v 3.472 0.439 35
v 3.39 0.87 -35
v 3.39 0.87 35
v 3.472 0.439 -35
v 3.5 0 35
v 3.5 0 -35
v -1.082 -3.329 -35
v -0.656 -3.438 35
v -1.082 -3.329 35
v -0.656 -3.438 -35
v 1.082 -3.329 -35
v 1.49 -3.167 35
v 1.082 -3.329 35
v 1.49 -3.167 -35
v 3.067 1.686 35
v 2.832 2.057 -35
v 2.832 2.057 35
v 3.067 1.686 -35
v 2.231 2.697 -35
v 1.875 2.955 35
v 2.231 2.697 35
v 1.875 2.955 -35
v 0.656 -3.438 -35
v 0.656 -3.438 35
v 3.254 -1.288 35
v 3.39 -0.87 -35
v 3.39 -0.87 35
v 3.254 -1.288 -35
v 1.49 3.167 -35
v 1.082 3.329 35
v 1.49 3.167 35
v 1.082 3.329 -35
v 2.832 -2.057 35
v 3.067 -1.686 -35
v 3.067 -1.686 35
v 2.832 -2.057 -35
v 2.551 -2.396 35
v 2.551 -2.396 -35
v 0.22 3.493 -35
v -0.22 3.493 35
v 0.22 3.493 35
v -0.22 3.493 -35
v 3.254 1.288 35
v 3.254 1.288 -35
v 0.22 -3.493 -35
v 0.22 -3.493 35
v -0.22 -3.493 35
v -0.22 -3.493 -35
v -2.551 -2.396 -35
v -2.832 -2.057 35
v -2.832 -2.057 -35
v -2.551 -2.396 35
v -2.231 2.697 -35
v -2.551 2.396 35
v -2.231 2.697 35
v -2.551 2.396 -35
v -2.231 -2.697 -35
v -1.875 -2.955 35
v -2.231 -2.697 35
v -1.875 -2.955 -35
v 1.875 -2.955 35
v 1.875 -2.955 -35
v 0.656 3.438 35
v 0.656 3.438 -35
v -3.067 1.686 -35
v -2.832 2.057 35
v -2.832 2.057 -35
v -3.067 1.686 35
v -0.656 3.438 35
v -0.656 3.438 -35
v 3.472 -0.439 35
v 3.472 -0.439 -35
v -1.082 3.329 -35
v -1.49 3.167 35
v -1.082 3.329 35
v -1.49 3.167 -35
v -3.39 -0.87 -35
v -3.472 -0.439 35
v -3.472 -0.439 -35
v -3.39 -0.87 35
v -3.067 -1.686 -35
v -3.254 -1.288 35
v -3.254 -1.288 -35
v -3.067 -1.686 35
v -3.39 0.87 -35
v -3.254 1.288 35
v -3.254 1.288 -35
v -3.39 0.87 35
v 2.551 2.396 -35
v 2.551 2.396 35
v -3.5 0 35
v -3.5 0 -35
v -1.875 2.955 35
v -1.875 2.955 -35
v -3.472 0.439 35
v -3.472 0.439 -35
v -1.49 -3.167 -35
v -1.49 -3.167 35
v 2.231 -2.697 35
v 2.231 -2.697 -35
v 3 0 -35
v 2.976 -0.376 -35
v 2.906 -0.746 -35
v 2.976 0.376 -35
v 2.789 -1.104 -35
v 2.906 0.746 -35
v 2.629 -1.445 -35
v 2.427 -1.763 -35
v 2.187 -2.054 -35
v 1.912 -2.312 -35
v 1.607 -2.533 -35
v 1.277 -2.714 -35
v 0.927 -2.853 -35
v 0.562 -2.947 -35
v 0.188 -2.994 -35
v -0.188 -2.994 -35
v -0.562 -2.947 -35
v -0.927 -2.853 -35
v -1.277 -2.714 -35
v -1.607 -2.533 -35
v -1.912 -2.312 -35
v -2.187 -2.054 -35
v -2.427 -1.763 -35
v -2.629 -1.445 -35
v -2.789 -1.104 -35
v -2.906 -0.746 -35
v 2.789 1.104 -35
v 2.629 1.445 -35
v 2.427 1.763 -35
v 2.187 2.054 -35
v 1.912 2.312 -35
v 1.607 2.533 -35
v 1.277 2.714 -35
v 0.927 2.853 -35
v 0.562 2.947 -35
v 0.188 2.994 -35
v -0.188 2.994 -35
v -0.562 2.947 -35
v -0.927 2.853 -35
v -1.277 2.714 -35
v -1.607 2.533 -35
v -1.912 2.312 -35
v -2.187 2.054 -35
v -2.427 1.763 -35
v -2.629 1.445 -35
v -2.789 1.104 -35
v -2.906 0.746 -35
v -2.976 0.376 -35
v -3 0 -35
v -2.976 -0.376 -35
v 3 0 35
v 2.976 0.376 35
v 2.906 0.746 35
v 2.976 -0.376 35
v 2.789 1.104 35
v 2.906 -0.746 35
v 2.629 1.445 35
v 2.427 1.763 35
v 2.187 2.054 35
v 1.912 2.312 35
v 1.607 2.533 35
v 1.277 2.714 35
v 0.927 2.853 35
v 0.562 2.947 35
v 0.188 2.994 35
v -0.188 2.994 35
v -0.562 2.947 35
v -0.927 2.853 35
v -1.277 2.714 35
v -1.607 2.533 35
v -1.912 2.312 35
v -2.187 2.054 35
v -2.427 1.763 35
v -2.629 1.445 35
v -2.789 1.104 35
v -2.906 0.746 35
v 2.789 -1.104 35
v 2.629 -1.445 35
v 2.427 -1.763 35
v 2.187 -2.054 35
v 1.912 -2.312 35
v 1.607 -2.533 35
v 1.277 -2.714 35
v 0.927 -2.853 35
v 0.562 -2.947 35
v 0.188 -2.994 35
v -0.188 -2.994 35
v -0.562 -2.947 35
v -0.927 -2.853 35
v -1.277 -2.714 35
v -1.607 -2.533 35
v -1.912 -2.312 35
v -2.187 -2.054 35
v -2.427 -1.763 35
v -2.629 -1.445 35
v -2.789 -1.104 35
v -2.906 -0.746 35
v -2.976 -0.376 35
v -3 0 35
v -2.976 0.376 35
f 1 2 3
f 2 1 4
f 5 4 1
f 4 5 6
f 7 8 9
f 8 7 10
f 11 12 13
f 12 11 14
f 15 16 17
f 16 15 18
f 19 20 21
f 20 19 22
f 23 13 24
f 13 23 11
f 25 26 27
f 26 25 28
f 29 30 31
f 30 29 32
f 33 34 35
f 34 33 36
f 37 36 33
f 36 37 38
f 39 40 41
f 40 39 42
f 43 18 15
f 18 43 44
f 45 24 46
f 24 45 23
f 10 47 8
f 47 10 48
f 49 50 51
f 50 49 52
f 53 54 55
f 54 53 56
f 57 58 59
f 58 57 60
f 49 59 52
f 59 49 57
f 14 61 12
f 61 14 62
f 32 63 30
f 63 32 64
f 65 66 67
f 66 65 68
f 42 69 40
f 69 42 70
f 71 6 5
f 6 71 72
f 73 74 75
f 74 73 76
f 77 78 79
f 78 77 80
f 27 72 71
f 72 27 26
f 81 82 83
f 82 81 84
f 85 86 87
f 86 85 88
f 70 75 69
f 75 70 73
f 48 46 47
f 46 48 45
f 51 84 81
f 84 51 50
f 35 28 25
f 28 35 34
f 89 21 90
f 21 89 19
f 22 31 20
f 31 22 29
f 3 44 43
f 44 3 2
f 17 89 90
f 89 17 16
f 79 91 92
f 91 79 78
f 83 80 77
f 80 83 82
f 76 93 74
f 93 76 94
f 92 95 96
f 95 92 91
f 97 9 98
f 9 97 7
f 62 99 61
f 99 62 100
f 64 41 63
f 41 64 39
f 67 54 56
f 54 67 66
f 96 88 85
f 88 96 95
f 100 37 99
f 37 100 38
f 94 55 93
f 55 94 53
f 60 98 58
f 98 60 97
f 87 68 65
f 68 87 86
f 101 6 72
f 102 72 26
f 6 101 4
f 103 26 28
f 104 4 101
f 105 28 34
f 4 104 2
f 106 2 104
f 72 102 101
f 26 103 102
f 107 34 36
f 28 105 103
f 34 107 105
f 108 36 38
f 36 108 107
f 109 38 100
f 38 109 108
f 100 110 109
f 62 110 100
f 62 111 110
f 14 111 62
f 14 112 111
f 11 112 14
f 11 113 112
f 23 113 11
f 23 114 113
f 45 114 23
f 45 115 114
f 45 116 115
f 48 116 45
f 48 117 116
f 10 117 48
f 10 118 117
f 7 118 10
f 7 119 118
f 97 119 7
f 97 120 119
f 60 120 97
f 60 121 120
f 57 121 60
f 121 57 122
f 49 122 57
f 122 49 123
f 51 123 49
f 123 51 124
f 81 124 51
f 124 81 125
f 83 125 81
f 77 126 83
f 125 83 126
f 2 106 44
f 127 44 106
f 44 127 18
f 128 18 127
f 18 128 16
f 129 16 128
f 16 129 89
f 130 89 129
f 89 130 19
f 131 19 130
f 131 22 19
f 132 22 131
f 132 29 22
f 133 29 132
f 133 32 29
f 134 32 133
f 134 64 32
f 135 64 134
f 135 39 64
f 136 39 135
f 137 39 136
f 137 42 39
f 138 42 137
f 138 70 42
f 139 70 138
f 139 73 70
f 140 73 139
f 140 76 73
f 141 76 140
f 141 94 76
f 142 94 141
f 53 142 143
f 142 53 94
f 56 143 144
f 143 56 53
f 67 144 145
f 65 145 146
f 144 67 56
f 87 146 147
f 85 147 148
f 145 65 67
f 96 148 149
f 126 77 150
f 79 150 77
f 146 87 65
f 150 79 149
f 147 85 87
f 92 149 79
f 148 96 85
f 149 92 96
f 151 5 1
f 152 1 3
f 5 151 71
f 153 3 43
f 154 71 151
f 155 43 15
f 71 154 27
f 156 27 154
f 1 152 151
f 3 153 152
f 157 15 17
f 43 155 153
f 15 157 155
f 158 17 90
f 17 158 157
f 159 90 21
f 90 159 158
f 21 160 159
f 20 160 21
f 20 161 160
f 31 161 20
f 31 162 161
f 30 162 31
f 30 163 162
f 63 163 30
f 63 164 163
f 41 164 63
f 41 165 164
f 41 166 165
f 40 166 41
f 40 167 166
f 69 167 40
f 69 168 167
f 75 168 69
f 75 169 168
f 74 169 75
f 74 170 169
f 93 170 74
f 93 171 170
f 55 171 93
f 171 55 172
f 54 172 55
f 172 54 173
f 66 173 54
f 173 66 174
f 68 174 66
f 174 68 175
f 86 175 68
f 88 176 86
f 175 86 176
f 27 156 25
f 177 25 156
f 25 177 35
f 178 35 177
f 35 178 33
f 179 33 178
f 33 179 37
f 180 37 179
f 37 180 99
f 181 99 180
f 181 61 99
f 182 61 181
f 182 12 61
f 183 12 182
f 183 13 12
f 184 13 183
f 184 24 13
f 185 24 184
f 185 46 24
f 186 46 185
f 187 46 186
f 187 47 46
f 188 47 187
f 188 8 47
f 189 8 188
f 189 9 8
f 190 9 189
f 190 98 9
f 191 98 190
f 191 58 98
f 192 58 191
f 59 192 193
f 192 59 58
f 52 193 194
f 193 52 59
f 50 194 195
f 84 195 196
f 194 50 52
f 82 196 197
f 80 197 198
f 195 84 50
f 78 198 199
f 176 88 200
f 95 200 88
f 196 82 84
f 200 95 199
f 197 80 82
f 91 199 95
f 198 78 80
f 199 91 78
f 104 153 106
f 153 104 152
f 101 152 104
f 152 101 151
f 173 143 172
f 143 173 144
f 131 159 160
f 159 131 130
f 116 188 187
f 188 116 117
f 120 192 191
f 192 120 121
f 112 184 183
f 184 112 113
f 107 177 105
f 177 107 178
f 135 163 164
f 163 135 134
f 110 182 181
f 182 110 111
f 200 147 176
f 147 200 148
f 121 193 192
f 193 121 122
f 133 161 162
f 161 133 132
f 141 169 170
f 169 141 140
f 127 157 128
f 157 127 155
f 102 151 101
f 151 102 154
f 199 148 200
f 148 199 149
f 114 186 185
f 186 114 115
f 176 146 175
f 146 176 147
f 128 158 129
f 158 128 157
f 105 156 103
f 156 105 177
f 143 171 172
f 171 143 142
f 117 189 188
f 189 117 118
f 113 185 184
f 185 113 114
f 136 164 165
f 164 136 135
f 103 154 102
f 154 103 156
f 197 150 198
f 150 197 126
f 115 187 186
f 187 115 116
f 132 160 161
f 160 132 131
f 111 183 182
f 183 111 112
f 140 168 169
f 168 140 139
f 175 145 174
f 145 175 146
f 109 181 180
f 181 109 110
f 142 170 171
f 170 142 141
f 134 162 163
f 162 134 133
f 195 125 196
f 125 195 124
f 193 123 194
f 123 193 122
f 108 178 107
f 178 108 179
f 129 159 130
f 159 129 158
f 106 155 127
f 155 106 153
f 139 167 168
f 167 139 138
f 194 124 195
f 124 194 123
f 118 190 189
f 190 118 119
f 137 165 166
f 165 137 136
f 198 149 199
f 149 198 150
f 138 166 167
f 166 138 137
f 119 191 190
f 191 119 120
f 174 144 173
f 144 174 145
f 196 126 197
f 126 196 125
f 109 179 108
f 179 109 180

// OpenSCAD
$fn = 50;


difference() {
	union() {
		translate(v = [0, 0, -35.0000000000]) {
			cylinder(h = 70, r = 3.5000000000);
		}
	}
	union() {
		translate(v = [0, 0, -100.0000000000]) {
			cylinder(h = 200, r = 3.0000000000);
		}
	}
}
